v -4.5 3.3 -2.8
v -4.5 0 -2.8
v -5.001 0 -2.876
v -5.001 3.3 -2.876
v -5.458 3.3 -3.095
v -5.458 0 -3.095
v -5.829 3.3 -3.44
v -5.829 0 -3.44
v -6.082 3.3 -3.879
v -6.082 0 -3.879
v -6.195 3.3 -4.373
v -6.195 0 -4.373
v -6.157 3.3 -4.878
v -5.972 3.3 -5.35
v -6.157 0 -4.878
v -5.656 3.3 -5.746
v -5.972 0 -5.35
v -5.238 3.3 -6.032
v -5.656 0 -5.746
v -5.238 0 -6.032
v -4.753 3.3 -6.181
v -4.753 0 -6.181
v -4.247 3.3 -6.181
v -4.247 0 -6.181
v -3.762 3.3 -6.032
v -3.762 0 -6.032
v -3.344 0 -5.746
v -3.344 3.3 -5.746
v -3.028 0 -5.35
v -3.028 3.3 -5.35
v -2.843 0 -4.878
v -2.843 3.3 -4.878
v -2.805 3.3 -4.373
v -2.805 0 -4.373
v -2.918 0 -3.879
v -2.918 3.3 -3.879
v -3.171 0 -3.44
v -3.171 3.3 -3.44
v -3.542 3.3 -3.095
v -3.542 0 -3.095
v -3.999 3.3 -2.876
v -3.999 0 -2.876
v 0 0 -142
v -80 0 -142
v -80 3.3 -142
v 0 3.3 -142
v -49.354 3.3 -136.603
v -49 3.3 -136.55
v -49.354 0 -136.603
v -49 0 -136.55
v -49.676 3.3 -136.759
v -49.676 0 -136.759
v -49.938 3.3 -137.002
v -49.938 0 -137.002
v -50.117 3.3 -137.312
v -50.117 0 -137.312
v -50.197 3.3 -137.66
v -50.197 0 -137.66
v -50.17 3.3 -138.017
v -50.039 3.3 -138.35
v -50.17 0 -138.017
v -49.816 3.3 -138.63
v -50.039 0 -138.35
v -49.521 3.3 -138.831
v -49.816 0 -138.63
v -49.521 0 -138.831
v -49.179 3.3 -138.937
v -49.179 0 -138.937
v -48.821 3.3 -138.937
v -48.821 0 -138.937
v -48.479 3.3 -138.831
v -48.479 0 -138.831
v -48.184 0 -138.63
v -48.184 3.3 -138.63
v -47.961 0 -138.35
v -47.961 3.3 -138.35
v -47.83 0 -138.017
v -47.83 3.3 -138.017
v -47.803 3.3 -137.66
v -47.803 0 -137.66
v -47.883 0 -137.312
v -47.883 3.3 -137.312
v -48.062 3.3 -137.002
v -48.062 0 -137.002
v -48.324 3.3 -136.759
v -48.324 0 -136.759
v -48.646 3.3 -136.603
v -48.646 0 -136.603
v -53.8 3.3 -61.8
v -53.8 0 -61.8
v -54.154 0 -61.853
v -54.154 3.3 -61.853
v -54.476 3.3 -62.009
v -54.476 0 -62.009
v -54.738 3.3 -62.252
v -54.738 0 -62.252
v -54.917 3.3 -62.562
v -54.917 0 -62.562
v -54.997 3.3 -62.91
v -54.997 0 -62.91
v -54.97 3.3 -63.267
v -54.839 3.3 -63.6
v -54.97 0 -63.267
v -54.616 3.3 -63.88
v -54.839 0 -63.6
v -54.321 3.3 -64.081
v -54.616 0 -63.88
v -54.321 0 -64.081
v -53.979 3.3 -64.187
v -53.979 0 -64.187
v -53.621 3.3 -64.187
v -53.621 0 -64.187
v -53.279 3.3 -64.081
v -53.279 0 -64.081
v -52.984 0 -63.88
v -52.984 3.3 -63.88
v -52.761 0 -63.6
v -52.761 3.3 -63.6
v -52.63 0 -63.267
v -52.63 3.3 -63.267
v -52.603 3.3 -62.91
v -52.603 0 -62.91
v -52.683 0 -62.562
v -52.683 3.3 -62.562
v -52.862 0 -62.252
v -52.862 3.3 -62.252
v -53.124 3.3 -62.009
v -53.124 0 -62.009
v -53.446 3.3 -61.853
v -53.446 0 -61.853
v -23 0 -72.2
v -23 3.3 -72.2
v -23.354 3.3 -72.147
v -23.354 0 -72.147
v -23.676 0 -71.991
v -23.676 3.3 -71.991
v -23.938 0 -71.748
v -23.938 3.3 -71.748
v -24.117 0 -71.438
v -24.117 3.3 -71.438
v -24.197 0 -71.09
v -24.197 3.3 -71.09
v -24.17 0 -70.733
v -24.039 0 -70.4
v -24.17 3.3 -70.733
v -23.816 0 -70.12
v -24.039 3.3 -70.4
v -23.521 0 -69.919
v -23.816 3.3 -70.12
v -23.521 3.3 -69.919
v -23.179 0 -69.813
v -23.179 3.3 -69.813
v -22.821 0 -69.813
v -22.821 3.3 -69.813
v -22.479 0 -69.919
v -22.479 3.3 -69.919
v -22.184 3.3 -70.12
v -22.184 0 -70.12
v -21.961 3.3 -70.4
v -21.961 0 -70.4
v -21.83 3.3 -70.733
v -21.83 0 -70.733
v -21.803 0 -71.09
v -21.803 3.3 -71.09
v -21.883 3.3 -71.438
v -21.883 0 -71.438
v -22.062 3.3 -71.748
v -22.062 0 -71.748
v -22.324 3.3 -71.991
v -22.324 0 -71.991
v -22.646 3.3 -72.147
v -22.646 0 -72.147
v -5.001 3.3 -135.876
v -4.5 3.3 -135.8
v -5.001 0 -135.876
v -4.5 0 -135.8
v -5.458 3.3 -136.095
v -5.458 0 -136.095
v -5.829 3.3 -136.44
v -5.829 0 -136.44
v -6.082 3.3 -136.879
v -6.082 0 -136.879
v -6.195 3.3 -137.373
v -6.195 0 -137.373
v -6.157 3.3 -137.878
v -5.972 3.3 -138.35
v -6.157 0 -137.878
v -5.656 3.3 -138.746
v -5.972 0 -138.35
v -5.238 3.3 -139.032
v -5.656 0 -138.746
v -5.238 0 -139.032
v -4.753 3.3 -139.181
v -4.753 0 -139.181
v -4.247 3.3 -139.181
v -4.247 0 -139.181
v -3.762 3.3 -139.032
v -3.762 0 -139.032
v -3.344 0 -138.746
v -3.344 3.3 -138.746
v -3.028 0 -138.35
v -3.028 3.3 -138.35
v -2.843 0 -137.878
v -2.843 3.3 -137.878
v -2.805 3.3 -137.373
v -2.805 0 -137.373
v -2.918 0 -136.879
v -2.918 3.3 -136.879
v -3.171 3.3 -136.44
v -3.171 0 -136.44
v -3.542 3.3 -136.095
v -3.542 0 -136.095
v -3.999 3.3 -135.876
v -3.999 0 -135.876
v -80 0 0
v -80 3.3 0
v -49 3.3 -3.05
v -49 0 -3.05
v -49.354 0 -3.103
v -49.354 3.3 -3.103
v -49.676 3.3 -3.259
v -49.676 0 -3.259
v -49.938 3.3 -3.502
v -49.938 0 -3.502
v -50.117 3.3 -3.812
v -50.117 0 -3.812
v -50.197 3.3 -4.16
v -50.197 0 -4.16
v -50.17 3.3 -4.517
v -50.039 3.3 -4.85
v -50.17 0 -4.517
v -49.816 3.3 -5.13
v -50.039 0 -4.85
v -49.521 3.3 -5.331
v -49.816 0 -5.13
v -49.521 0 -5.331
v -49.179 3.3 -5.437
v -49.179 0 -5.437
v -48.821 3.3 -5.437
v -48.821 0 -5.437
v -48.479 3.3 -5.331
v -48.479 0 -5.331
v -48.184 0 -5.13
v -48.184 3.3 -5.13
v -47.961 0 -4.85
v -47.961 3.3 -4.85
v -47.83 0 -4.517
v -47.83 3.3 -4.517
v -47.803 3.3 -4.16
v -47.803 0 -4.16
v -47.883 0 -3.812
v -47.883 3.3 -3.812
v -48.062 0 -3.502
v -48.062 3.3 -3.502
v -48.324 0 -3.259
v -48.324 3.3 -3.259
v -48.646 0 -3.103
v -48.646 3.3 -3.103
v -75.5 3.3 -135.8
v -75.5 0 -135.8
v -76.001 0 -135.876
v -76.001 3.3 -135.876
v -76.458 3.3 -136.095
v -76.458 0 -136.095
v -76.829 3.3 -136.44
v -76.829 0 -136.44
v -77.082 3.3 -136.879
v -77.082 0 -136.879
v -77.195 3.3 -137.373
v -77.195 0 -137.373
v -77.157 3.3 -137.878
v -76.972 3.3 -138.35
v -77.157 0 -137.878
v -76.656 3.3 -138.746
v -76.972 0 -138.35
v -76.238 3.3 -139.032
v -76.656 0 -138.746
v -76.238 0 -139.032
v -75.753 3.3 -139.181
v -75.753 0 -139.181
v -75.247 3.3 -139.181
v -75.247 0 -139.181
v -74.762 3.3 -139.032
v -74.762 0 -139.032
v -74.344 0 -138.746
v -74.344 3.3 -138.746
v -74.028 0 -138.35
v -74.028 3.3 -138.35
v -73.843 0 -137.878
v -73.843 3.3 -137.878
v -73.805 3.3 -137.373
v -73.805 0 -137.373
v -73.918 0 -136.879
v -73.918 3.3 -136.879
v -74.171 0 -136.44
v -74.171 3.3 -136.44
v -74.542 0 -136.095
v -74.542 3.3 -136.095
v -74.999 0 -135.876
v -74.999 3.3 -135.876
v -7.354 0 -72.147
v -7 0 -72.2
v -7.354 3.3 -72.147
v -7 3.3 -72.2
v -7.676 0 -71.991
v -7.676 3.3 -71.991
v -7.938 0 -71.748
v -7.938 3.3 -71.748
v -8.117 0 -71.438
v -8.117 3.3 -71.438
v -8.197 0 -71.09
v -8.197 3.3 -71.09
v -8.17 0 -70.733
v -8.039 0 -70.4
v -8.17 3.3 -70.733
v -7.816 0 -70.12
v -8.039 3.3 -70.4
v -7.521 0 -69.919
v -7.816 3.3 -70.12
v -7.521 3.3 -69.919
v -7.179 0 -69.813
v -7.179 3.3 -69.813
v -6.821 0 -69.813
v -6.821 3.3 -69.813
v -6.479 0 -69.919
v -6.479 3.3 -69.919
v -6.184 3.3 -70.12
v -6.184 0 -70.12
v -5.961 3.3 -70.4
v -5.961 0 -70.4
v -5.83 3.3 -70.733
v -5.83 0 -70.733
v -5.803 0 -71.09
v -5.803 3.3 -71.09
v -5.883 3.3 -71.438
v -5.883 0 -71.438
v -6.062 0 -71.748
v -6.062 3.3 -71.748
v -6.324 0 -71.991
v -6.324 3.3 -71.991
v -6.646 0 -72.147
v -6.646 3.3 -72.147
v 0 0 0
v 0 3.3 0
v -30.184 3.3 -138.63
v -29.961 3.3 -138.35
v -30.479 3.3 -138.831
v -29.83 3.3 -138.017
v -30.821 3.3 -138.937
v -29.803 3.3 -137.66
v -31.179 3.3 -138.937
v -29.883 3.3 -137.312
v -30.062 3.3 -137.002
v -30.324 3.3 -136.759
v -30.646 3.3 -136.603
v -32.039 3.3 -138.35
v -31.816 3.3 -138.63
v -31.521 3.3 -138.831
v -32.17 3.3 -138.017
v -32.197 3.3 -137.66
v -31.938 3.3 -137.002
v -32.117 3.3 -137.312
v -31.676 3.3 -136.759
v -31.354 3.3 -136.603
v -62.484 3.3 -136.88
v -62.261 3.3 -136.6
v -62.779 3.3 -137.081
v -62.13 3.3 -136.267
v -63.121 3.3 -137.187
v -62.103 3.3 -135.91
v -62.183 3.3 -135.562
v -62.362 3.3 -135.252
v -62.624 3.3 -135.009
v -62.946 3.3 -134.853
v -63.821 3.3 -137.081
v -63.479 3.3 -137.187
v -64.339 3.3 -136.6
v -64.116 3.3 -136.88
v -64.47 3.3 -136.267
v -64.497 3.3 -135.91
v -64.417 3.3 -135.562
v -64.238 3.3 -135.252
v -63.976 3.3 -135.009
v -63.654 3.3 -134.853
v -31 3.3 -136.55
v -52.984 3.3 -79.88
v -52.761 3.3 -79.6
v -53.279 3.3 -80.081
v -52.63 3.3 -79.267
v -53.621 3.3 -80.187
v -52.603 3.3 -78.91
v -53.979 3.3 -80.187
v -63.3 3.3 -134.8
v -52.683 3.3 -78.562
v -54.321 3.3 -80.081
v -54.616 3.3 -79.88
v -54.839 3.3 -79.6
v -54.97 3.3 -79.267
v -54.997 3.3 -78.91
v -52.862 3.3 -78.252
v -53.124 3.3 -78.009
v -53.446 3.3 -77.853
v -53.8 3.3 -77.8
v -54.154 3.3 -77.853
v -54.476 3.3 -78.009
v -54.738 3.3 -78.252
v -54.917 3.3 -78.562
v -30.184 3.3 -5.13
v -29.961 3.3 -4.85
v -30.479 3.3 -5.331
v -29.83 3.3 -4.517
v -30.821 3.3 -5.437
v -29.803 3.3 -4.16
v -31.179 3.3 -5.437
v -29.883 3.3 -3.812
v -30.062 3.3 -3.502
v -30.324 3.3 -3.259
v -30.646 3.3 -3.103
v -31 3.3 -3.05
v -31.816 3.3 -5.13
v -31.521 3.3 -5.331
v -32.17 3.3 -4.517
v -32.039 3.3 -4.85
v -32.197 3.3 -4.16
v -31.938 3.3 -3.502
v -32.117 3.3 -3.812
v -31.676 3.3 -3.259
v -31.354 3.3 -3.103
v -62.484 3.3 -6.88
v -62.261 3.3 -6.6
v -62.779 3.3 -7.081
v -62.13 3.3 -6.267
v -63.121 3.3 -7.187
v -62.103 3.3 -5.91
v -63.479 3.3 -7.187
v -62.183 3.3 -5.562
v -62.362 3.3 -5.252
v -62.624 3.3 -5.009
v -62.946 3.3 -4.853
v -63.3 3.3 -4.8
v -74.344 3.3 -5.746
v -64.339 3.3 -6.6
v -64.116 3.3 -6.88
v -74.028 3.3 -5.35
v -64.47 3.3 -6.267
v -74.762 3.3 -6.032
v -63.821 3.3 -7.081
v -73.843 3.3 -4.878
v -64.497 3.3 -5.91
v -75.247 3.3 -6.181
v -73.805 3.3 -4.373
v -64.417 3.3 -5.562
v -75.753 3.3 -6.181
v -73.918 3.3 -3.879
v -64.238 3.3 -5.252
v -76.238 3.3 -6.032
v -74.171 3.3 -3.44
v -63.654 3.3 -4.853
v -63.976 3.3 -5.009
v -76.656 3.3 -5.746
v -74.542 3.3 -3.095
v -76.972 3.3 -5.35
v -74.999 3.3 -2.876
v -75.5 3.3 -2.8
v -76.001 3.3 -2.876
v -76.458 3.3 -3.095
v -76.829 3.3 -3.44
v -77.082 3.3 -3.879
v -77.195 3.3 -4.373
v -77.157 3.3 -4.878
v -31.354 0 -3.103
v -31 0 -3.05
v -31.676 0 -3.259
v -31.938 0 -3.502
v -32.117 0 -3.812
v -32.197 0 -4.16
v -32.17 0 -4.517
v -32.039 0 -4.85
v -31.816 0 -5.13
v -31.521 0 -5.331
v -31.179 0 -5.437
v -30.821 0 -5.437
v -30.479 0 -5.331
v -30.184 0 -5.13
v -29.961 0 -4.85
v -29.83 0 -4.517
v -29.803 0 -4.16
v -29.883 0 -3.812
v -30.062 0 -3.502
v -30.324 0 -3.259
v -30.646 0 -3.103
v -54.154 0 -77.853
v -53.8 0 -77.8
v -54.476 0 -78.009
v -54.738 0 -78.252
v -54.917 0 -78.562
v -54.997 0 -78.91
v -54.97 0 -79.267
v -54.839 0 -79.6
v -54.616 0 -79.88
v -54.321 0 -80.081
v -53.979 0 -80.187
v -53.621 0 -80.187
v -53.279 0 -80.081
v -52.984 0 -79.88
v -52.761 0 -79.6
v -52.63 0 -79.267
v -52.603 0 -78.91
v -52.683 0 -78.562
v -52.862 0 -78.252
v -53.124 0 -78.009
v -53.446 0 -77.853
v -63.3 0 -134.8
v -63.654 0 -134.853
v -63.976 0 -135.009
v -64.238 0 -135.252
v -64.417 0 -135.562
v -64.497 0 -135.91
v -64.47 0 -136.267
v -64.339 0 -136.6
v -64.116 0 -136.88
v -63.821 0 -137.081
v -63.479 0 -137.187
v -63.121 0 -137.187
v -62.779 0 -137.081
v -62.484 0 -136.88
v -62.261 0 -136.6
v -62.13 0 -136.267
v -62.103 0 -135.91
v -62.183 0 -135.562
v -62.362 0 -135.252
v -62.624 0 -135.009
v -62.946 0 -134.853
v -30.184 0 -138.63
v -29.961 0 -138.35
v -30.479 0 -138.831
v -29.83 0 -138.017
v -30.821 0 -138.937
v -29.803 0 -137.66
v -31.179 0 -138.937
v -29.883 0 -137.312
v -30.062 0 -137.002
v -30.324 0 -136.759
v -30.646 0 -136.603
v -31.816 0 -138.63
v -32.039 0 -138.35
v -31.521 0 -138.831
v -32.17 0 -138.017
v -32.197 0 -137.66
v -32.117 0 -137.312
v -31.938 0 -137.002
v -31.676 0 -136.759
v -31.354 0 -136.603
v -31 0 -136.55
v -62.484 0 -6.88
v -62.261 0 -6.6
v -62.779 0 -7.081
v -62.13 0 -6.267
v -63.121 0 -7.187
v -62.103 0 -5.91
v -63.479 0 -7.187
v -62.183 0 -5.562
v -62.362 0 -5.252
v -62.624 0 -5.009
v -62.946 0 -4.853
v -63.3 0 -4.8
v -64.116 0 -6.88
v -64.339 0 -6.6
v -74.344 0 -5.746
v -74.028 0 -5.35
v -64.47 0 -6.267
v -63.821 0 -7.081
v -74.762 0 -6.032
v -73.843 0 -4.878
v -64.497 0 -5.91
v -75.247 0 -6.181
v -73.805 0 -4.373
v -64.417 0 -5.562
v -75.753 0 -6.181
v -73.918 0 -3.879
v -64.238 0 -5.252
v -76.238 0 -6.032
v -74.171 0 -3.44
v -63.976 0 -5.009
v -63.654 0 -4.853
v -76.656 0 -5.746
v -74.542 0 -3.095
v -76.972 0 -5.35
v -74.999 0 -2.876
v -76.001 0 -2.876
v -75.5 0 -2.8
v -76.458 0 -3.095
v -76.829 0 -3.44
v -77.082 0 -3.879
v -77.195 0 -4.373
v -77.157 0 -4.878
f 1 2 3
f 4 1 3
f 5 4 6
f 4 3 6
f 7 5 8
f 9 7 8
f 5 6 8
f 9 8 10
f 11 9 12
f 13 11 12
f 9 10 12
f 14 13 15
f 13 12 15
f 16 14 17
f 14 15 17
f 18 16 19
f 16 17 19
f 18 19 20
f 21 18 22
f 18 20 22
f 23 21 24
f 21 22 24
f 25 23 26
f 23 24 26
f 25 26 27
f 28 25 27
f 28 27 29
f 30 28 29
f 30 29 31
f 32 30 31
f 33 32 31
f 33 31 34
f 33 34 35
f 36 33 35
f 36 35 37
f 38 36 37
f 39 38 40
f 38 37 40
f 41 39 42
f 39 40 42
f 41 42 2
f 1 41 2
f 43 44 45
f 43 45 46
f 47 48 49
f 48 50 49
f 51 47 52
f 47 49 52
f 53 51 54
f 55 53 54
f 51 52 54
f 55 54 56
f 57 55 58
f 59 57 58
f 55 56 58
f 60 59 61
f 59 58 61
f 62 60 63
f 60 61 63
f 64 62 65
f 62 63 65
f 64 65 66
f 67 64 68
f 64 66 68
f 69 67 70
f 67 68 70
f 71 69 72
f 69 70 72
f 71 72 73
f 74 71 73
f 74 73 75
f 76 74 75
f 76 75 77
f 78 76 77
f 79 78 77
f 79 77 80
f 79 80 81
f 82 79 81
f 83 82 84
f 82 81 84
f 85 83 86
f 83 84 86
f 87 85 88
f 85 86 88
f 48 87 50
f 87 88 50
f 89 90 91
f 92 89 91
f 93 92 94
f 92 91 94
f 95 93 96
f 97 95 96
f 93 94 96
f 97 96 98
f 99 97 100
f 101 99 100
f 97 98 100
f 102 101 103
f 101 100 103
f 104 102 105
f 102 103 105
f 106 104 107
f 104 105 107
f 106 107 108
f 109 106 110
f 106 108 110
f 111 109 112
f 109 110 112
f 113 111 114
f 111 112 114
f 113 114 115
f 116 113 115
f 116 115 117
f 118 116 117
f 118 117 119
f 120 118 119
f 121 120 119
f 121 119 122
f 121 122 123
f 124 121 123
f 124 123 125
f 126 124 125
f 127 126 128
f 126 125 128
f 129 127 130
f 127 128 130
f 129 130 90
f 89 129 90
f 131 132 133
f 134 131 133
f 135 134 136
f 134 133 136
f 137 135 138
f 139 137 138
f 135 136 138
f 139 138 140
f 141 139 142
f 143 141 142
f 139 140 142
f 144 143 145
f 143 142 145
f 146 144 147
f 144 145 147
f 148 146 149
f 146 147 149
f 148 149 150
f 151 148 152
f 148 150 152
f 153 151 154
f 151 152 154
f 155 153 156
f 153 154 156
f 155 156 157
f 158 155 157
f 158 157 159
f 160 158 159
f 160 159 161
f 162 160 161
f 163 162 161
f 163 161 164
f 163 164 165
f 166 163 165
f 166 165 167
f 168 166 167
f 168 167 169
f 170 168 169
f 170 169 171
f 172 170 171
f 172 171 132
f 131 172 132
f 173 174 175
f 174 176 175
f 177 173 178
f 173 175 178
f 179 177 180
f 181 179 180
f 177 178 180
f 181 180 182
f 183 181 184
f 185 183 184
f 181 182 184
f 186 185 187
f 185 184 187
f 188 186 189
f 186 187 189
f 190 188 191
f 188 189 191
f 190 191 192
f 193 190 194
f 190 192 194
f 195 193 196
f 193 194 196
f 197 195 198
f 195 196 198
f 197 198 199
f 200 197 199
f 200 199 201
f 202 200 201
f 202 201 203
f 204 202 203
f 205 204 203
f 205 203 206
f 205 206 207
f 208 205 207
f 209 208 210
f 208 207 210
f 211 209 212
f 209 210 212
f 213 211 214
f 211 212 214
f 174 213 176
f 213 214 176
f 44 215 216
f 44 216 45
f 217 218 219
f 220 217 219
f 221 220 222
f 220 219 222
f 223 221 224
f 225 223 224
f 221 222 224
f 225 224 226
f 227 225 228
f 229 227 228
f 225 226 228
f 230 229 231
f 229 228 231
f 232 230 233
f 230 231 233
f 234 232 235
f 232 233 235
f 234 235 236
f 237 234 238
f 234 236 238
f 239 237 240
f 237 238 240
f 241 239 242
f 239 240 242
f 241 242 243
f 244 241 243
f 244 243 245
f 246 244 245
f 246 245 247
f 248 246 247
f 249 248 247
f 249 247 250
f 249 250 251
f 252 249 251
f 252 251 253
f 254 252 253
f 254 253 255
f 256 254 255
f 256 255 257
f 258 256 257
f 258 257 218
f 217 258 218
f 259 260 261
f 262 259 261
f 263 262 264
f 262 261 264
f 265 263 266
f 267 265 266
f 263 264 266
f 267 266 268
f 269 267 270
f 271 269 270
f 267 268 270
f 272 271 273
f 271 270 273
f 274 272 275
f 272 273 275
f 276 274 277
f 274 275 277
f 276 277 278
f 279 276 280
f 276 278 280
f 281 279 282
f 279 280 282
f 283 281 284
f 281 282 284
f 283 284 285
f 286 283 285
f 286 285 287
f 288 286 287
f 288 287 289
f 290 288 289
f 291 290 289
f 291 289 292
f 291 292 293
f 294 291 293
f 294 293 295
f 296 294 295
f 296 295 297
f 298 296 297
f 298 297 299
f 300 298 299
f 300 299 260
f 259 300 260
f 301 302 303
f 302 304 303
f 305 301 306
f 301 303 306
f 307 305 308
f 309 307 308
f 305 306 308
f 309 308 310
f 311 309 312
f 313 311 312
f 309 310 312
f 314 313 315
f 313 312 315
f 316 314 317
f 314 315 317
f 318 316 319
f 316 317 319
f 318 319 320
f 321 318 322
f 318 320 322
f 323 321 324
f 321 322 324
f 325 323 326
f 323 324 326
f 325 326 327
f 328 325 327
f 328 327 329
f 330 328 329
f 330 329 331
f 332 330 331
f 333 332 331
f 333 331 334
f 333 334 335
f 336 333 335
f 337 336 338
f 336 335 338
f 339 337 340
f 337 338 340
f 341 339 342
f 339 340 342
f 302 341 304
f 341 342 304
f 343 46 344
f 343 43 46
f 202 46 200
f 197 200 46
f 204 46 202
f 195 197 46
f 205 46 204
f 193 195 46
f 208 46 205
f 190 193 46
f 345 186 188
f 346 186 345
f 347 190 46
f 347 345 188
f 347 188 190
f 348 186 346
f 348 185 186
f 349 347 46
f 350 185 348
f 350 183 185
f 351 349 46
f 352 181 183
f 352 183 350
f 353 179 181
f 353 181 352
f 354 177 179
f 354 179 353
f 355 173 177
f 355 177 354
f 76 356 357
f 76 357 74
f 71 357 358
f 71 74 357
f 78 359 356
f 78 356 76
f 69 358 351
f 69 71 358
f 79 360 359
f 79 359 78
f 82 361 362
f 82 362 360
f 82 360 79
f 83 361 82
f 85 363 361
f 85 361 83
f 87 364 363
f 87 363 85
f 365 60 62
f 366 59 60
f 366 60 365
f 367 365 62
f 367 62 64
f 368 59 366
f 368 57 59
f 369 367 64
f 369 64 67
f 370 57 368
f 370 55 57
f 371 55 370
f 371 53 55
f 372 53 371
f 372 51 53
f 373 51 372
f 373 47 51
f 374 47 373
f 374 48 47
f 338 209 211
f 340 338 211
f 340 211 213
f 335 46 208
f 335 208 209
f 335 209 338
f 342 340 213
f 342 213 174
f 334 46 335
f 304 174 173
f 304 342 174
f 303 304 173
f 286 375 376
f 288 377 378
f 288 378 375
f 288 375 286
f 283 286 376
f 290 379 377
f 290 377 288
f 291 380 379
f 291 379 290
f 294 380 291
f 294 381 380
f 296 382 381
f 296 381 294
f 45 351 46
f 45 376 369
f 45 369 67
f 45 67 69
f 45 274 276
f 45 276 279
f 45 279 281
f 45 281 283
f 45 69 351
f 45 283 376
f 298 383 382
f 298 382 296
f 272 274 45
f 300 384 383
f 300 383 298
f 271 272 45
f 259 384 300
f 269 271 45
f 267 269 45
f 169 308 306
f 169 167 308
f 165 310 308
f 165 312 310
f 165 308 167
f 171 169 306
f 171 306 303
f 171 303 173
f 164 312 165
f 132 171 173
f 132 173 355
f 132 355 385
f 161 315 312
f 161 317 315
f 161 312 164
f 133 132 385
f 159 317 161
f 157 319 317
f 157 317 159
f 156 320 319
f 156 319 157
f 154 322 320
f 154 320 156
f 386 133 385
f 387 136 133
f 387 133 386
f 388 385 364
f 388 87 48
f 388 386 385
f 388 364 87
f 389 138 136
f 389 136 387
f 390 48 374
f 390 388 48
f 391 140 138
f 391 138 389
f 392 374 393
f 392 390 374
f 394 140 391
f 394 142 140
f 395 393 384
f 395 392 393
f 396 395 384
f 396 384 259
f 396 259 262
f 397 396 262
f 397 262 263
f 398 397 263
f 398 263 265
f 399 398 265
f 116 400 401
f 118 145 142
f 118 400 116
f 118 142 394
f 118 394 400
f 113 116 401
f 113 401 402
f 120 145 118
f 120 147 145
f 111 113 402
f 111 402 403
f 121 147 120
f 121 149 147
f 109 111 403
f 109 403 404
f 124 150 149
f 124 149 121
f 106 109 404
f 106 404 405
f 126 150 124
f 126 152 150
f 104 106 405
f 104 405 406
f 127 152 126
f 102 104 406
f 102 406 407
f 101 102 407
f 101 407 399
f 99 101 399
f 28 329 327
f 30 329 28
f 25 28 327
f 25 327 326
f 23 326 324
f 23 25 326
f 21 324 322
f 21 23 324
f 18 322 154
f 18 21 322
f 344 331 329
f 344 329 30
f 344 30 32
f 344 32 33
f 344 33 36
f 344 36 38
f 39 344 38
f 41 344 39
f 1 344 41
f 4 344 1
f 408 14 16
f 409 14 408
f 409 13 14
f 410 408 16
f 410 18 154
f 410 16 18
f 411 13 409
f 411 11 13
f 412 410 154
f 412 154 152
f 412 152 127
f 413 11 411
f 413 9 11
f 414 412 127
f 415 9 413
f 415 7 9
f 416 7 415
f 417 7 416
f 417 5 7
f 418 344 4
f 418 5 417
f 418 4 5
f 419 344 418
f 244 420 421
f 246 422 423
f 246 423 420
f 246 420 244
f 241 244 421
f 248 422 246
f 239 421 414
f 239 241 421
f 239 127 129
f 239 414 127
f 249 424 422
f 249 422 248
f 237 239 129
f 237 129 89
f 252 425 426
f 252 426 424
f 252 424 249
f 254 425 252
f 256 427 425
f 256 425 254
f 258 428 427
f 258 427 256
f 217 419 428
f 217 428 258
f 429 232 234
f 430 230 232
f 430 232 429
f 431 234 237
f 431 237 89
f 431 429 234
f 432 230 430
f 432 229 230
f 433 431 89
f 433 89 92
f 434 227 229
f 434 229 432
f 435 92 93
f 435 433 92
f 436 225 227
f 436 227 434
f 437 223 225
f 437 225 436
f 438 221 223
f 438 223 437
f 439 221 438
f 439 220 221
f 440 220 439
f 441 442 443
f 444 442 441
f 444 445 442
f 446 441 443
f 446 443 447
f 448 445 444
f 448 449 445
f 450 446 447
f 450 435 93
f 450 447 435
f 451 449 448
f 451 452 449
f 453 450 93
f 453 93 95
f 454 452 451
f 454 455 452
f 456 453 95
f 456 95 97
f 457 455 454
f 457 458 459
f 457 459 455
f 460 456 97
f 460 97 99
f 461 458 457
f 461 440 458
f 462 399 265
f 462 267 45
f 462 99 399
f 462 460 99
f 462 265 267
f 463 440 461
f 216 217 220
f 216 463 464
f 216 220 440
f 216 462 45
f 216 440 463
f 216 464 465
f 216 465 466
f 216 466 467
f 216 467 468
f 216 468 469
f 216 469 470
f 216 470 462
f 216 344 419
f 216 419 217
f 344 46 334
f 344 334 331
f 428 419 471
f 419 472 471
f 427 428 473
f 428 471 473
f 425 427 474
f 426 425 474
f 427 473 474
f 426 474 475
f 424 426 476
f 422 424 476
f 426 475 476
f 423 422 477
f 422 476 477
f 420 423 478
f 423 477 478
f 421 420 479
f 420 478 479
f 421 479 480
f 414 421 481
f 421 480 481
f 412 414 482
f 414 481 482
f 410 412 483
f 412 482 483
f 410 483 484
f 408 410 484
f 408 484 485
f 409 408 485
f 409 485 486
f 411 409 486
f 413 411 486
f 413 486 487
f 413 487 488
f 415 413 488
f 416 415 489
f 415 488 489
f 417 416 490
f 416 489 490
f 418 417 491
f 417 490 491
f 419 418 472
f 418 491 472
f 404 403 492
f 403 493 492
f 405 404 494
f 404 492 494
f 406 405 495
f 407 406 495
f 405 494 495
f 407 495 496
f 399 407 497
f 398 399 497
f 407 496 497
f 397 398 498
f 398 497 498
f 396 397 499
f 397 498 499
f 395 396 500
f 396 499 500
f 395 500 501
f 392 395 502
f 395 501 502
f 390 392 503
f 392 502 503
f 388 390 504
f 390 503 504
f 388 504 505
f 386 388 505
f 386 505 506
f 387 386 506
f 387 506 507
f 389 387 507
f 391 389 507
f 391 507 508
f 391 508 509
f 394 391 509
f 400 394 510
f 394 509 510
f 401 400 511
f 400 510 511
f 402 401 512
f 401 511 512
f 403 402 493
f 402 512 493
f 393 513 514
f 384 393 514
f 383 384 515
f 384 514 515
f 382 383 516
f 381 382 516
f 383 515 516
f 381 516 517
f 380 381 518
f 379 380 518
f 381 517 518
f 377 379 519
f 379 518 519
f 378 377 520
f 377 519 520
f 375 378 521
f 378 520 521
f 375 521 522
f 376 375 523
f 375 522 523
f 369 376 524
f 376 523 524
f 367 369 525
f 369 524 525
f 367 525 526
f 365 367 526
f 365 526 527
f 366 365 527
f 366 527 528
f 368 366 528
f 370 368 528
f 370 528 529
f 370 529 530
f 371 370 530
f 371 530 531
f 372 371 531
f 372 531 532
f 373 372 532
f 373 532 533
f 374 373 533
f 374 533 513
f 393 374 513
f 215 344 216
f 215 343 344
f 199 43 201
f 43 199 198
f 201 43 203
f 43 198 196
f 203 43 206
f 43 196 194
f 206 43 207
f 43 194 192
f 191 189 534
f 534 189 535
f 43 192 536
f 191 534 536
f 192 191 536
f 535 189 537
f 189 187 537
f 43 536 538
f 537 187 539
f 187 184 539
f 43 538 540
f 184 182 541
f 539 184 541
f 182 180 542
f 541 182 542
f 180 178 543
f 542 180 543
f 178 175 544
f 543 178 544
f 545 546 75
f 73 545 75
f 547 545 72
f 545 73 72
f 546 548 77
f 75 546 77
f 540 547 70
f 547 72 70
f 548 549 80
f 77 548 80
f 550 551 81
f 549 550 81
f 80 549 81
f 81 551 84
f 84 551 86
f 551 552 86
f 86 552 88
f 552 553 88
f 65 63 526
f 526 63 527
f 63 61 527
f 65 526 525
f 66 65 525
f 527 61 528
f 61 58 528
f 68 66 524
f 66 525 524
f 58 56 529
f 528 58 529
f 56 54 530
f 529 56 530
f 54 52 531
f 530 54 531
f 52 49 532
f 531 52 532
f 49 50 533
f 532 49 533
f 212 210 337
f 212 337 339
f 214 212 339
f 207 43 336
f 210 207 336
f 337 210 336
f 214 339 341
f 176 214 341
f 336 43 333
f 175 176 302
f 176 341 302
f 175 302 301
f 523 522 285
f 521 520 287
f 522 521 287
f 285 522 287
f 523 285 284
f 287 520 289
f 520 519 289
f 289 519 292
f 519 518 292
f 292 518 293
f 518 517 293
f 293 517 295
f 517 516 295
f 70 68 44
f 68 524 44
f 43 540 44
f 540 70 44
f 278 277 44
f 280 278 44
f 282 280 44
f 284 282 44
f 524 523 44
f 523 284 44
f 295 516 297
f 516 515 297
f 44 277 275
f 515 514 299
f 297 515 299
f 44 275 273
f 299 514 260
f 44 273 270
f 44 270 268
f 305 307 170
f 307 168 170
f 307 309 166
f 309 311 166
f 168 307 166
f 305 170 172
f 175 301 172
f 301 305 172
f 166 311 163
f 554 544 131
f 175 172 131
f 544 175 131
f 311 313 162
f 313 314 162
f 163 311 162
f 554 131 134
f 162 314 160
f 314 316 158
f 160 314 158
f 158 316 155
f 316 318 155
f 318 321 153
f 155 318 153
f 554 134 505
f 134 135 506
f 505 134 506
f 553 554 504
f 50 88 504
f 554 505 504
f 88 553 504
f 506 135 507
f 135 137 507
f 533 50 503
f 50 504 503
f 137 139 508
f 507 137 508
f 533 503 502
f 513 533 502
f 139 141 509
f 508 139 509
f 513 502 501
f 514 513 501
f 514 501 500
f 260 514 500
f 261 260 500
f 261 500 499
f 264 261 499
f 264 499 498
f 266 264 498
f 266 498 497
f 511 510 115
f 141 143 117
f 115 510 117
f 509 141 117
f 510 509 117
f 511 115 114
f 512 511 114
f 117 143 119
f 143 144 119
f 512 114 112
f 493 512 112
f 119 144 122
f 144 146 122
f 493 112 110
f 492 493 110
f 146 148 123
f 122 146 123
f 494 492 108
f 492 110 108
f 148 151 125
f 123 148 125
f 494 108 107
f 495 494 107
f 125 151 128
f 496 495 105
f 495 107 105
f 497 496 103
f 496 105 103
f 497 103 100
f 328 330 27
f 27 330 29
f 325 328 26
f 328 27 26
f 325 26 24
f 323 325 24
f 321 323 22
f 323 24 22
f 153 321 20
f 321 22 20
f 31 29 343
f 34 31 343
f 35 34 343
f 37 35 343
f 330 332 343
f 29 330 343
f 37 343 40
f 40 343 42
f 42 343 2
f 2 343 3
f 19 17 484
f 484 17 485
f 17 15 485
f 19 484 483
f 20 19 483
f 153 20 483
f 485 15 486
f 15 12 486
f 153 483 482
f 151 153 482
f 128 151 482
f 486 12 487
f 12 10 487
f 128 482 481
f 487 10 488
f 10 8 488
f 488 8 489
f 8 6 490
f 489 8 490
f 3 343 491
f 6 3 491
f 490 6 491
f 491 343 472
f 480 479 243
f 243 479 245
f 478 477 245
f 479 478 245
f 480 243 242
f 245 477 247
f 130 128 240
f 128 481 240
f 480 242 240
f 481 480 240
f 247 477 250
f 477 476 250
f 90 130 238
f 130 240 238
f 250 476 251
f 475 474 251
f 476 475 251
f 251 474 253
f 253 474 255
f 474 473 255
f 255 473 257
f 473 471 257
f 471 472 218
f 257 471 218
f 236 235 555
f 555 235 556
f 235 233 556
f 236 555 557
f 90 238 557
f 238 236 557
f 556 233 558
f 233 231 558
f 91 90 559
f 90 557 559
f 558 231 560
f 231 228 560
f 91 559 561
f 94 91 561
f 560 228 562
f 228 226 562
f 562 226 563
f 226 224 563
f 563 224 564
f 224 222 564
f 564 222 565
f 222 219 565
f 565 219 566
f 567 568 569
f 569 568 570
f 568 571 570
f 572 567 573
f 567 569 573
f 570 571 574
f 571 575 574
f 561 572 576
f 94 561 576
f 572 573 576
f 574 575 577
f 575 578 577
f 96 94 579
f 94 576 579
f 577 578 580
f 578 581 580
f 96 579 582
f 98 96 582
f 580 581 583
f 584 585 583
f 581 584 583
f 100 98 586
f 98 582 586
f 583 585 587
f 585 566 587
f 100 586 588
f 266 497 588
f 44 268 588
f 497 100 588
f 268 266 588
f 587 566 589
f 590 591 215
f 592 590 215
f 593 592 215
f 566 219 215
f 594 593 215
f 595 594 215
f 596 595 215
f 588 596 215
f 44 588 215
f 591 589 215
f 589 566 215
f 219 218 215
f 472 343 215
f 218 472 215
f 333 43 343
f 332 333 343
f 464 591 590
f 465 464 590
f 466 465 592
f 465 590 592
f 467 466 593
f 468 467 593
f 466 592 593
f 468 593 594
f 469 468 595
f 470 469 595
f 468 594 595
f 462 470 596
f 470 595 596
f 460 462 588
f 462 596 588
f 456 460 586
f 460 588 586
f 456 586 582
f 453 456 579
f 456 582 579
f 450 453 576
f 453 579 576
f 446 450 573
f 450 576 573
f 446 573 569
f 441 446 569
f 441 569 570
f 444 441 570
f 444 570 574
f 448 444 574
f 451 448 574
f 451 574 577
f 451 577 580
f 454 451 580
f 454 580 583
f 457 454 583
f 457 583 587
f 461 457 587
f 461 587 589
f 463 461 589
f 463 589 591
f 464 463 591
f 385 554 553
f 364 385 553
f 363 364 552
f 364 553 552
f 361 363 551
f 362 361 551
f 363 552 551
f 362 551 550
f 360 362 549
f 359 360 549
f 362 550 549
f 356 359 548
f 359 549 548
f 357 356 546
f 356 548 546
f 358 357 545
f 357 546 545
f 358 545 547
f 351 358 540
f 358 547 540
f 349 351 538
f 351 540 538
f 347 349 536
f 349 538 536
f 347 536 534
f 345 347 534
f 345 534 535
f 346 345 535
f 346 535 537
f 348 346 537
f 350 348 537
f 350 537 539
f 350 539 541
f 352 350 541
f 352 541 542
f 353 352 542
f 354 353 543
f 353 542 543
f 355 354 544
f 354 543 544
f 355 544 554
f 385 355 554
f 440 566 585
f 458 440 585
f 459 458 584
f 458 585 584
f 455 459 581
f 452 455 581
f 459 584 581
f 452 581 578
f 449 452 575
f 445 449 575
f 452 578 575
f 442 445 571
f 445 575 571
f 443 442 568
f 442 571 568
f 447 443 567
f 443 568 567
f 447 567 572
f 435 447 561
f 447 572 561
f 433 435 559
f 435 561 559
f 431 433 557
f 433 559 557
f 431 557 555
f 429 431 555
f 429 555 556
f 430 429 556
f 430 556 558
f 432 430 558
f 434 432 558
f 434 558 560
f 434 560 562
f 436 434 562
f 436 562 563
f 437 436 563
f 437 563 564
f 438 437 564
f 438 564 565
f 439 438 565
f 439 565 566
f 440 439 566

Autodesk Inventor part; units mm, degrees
ref_plane "YZ Plane" through (0, 0, 0) normal (1, 0, 0) x (0, 1, 0)
ref_plane "XZ Plane" through (0, 0, 0) normal (0, 1, 0) x (-1, 0, 0)
ref_plane "XY Plane" through (0, 0, 0) normal (0, 0, 1) x (1, 0, 0)
sketch "スケッチ1" plane through (0, 0, 0) normal (0, 1, 0) x (-1, 0, 0)
  line L0 (0, 0) -> (80, 0)
  line L1 (80, 0) -> (80, -142)
  line L2 (80, -142) -> (0, -142)
  line L3 (0, -142) -> (0, 0)
  dimension "d0" = 80
  dimension "d1" = 142
extrude "押し出し1" add sketch "スケッチ1" along normal blind 3.3
hole "穴1" at (-75.5, 3.3, -4.5) direction (0, -1, 0) diameter 3.4 end through all
hole "穴2" at (-4.5, 3.3, -4.5) direction (0, -1, 0) diameter 3.4 end through all
hole "穴3" at (-4.5, 3.3, -137.5) direction (0, -1, 0) diameter 3.4 end through all
hole "穴4" at (-75.5, 3.3, -137.5) direction (0, -1, 0) diameter 3.4 end through all
hole "穴5" at (-49, 3.3, -137.75) direction (0, -1, 0) diameter 2.4 end through all
hole "穴6" at (-31, 3.3, -137.75) direction (0, -1, 0) diameter 2.4 end through all
hole "穴7" at (-31, 3.3, -4.25) direction (0, -1, 0) diameter 2.4 end through all
hole "穴8" at (-49, 3.3, -4.25) direction (0, -1, 0) diameter 2.4 end through all
hole "穴9" at (-7, 0, -71) direction (0, 1, 0) diameter 2.4 end through all
hole "穴10" at (-23, 0, -71) direction (0, 1, 0) diameter 2.4 end through all
sketch "スケッチ3" plane through (0, 3.3, 0) normal (0, 1, 0) x (1, 0, 0)
  line L0 (0, 0) -> (0, 142) projected
  line L1 (0, 71) -> (-80, 71)
  line L2 (-80, 142) -> (-80, 0) projected
hole "穴12" at (-63.3, 3.3, -6) direction (0, -1, 0) diameter 2.4 end through all
hole "穴13" at (-53.8, 3.3, -63) direction (0, -1, 0) diameter 2.4 end through all
sketch "スケッチ4" plane through (0, 3.3, 0) normal (0, 1, 0) x (1, 0, 0)
  circle A0 centre (-63.3, 6) radius 1.2 projected
  circle A1 centre (-53.8, 63) radius 1.2 projected
  line L0 (-80, 0) -> (-80, 142) projected
  line L1 (-80, 71) -> (0, 71)
  point P0 (0, 0)
  point P1 (-63.3, 136)
  point P2 (-53.8, 79)
hole "穴14" at (-63.3, 3.3, -136) at (-53.8, 3.3, -79) direction (0, -1, 0) diameter 2.4 end through all
properties part number "基本板()" material "アルミニウム 5052"
